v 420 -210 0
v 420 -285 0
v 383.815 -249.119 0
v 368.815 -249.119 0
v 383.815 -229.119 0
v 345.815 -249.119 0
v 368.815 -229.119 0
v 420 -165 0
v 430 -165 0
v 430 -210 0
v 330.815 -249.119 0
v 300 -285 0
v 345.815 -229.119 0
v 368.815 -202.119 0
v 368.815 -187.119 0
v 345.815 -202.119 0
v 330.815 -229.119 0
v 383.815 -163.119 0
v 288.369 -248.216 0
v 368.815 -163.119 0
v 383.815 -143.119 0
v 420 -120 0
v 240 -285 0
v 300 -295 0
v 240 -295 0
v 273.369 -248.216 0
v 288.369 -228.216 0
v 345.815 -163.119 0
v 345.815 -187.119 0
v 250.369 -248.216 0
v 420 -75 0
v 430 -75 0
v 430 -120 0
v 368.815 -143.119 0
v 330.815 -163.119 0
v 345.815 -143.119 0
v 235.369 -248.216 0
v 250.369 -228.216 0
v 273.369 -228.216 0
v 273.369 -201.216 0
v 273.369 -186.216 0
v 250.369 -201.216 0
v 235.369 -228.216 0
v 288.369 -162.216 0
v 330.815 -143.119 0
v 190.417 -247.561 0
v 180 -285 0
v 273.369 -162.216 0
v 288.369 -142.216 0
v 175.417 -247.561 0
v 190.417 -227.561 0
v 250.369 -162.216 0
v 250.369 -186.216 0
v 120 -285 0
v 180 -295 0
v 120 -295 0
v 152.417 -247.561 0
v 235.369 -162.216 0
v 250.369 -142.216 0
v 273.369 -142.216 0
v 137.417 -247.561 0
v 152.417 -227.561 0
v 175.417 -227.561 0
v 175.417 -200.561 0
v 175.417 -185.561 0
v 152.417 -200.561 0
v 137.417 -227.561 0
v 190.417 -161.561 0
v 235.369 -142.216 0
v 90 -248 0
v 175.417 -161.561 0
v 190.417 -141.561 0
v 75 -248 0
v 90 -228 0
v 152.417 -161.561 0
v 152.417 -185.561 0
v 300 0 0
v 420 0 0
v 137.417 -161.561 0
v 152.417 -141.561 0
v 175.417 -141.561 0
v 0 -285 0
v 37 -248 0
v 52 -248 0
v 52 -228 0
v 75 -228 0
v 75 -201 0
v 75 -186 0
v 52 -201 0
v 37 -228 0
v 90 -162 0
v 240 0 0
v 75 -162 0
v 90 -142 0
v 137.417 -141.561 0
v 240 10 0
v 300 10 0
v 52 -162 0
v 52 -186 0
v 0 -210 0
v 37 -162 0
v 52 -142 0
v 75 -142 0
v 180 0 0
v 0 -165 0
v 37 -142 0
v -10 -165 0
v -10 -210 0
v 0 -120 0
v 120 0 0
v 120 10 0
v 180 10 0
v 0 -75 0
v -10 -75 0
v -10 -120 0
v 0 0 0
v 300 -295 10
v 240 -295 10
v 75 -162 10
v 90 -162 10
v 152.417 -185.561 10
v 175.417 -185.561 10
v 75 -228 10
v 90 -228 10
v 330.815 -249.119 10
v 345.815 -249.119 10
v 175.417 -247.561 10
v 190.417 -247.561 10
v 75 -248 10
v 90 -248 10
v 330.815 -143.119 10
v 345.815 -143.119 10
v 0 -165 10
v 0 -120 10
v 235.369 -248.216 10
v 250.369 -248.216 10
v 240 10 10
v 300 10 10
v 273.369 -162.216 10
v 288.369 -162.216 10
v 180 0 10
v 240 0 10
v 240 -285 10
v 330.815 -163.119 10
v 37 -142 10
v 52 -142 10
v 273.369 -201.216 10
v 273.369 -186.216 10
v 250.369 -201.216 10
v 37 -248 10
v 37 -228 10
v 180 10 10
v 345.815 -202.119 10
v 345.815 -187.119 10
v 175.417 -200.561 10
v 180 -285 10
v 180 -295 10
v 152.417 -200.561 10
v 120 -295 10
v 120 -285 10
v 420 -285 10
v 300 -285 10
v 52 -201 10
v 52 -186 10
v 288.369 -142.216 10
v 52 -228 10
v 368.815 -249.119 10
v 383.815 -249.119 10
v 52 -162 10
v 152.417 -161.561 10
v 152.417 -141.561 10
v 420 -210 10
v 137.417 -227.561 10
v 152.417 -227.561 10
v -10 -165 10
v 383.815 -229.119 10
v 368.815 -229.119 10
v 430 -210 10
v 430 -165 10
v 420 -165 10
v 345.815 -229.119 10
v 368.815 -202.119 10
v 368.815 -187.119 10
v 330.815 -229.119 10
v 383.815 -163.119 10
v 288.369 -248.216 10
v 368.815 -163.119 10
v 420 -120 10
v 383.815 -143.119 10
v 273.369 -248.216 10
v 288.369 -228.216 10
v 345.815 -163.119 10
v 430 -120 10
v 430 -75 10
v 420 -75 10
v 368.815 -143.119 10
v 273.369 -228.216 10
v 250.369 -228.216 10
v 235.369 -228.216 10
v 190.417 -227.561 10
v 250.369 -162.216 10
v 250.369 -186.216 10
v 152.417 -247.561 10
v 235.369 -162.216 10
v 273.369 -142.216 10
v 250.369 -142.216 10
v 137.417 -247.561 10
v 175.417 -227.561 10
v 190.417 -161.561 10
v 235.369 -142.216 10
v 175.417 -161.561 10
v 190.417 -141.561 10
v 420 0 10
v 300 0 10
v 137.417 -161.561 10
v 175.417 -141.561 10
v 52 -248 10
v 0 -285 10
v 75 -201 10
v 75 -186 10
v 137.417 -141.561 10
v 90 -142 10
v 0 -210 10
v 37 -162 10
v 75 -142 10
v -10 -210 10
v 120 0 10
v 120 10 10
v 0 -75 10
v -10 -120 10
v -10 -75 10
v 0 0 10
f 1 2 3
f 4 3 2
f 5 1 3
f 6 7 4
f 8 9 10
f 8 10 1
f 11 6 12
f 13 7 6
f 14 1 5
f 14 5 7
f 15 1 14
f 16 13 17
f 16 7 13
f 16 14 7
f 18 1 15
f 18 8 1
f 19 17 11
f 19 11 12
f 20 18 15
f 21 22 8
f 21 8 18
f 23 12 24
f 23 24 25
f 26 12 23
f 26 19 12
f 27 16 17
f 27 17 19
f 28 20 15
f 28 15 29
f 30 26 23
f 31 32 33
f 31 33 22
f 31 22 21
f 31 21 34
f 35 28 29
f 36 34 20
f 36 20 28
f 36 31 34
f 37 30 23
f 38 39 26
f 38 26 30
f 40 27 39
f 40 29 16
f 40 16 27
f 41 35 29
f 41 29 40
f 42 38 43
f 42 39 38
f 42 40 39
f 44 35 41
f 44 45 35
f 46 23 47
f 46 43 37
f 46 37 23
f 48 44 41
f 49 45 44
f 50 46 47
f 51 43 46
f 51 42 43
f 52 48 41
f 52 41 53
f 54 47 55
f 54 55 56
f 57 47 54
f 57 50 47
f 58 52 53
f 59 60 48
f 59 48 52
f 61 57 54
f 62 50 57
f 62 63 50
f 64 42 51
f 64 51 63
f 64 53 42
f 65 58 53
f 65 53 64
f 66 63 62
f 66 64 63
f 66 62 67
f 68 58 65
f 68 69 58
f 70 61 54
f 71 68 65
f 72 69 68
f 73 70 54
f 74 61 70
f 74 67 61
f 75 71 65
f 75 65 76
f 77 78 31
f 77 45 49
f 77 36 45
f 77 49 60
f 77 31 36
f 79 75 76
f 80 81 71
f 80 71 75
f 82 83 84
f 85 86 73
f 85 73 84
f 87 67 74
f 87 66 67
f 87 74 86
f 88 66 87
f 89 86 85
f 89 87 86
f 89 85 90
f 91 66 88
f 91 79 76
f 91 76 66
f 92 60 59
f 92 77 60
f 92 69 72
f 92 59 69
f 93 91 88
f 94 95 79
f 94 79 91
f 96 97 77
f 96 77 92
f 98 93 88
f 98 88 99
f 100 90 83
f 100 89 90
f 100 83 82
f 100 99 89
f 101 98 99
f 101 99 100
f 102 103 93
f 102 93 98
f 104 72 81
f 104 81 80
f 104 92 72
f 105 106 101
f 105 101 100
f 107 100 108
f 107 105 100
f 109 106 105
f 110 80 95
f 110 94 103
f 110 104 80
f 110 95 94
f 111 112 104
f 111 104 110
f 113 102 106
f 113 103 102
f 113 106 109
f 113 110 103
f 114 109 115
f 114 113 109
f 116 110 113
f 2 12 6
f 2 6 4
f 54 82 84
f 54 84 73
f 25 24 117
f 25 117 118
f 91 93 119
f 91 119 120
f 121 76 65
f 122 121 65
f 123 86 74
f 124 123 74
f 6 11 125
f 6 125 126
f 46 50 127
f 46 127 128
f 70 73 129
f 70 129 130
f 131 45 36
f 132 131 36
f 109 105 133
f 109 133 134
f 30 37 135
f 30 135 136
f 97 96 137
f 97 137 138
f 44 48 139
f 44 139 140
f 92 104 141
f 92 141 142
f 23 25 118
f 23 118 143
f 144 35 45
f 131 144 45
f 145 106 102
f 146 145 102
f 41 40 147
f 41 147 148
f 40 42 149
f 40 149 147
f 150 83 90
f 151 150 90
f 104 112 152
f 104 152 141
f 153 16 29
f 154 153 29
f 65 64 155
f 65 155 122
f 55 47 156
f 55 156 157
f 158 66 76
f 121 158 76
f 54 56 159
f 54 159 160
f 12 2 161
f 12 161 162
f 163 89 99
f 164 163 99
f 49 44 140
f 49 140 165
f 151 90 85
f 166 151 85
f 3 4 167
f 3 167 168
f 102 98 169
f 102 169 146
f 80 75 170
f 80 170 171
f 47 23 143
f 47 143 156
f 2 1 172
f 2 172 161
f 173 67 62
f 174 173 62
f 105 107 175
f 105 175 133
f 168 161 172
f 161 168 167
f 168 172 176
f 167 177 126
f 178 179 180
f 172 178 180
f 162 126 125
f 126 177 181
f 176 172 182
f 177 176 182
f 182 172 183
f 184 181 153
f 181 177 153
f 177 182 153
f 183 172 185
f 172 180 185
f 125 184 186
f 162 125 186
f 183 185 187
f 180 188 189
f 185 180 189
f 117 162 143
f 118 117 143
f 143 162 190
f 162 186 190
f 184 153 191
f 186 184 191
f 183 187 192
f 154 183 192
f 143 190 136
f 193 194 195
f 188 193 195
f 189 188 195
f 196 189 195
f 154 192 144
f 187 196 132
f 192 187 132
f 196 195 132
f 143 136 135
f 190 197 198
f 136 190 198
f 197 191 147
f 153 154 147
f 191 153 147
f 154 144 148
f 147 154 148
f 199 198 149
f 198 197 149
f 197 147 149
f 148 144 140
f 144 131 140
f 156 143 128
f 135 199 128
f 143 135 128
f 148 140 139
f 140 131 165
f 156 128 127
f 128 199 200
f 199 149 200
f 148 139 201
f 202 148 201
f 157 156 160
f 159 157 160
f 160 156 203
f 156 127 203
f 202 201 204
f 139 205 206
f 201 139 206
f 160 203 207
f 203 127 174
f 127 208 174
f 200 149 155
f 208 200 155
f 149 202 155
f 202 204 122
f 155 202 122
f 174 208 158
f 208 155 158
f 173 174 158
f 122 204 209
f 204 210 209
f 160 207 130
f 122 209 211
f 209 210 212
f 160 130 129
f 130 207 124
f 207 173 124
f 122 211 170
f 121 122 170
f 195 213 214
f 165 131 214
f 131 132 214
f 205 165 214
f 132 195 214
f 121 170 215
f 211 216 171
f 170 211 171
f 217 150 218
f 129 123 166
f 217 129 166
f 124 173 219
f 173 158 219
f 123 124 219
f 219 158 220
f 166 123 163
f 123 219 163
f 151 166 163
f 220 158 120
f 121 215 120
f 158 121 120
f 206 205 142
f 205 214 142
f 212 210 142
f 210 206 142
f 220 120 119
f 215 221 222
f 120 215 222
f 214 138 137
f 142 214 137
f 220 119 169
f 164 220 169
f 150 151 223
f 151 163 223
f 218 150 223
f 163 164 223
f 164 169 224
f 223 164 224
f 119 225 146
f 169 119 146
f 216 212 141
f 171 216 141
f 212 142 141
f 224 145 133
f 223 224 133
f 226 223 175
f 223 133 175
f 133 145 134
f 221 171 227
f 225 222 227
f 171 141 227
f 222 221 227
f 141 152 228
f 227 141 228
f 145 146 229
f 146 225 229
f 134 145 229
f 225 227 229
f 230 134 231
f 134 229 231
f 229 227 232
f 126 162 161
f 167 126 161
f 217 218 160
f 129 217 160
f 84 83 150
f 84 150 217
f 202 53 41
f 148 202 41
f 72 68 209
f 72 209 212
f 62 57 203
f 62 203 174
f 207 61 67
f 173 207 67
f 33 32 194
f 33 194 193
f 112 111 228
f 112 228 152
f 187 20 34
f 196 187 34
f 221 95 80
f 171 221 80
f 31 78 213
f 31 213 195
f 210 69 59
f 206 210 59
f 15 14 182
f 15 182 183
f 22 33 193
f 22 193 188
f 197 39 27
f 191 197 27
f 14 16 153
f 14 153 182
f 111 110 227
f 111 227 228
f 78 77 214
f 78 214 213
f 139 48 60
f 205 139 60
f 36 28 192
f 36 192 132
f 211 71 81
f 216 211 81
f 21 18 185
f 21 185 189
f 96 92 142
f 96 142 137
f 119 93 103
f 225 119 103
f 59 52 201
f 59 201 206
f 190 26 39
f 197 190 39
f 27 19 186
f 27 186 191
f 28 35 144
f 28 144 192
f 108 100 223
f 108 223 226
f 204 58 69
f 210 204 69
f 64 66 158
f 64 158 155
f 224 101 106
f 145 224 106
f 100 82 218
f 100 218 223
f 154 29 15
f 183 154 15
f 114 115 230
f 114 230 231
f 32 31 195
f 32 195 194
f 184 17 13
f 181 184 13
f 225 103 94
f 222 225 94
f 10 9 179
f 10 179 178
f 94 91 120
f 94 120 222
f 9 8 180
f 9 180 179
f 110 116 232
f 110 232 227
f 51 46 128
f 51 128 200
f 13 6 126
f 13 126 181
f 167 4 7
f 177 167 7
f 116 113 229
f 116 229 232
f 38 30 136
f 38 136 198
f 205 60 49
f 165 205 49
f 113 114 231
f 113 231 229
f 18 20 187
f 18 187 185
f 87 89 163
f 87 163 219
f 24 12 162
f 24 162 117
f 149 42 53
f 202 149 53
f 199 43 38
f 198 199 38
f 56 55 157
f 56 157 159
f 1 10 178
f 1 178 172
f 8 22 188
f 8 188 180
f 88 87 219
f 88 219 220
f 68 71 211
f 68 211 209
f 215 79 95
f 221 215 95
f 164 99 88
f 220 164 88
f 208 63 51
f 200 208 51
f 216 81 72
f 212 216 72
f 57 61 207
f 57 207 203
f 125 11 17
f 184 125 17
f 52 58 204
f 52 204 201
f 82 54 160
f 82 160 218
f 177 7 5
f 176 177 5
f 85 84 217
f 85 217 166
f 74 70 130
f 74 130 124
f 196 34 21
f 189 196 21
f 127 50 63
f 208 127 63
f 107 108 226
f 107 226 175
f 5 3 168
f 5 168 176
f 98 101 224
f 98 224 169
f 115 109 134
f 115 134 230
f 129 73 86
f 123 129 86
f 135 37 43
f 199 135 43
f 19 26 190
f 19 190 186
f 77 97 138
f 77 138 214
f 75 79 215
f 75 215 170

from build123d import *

# Parameters (mm, degrees)
SKETCH2_W           = 15
SKETCH2_H           = 20
SKETCH2_W_2         = 23
SKETCH2_H_2         = 15
BOSS_EXTRUDE1_DEPTH = 10


with BuildPart() as part:
    # Sketch2 → Boss-Extrude1 (new body)
    with BuildSketch(Plane.XY):
        Polygon((0, 0), (120, 0), (120, 10), (180, 10), (180, 0), (240, 0), (240, 10), (300, 10), (300, 0), (420, 0), (420, -75), (430, -75), (430, -120), (420, -120), (420, -165), (430, -165), (430, -210), (420, -210), (420, -285), (300, -285), (300, -295), (240, -295), (240, -285), (180, -285), (180, -295), (120, -295), (120, -285), (0, -285), (0, -210), (-10, -210), (-10, -165), (0, -165), (0, -120), (-10, -120), (-10, -75), (0, -75), align=None)
        with Locations((144.916665259, -151.561421388)):
            Rectangle(SKETCH2_W, SKETCH2_H, mode=Mode.SUBTRACT)
        with Locations((338.315226992, -153.118682745)):
            Rectangle(SKETCH2_W, SKETCH2_H, mode=Mode.SUBTRACT)
        with Locations((376.315226992, -153.118682745)):
            Rectangle(SKETCH2_W, SKETCH2_H, mode=Mode.SUBTRACT)
        with Locations((338.315226992, -239.118682745)):
            Rectangle(SKETCH2_W, SKETCH2_H, mode=Mode.SUBTRACT)
        with Locations((44.5, -152)):
            Rectangle(SKETCH2_W, SKETCH2_H, mode=Mode.SUBTRACT)
        with Locations((82.5, -152)):
            Rectangle(SKETCH2_W, SKETCH2_H, mode=Mode.SUBTRACT)
        with Locations((44.5, -238)):
            Rectangle(SKETCH2_W, SKETCH2_H, mode=Mode.SUBTRACT)
        with Locations((82.5, -238)):
            Rectangle(SKETCH2_W, SKETCH2_H, mode=Mode.SUBTRACT)
        with Locations((63.5, -193.5)):
            Rectangle(SKETCH2_W_2, SKETCH2_H_2, mode=Mode.SUBTRACT)
        with Locations((182.916665259, -151.561421388)):
            Rectangle(SKETCH2_W, SKETCH2_H, mode=Mode.SUBTRACT)
        with Locations((144.916665259, -237.561421388)):
            Rectangle(SKETCH2_W, SKETCH2_H, mode=Mode.SUBTRACT)
        with Locations((182.916665259, -237.561421388)):
            Rectangle(SKETCH2_W, SKETCH2_H, mode=Mode.SUBTRACT)
        with Locations((163.916665259, -193.061421388)):
            Rectangle(SKETCH2_W_2, SKETCH2_H_2, mode=Mode.SUBTRACT)
        with Locations((242.869049507, -152.216184795)):
            Rectangle(SKETCH2_W, SKETCH2_H, mode=Mode.SUBTRACT)
        with Locations((280.869049507, -152.216184795)):
            Rectangle(SKETCH2_W, SKETCH2_H, mode=Mode.SUBTRACT)
        with Locations((242.869049507, -238.216184795)):
            Rectangle(SKETCH2_W, SKETCH2_H, mode=Mode.SUBTRACT)
        with Locations((280.869049507, -238.216184795)):
            Rectangle(SKETCH2_W, SKETCH2_H, mode=Mode.SUBTRACT)
        with Locations((261.869049507, -193.716184795)):
            Rectangle(SKETCH2_W_2, SKETCH2_H_2, mode=Mode.SUBTRACT)
        with Locations((376.315226992, -239.118682745)):
            Rectangle(SKETCH2_W, SKETCH2_H, mode=Mode.SUBTRACT)
        with Locations((357.315226992, -194.618682745)):
            Rectangle(SKETCH2_W_2, SKETCH2_H_2, mode=Mode.SUBTRACT)
    extrude(amount=BOSS_EXTRUDE1_DEPTH)


solid = part.part
